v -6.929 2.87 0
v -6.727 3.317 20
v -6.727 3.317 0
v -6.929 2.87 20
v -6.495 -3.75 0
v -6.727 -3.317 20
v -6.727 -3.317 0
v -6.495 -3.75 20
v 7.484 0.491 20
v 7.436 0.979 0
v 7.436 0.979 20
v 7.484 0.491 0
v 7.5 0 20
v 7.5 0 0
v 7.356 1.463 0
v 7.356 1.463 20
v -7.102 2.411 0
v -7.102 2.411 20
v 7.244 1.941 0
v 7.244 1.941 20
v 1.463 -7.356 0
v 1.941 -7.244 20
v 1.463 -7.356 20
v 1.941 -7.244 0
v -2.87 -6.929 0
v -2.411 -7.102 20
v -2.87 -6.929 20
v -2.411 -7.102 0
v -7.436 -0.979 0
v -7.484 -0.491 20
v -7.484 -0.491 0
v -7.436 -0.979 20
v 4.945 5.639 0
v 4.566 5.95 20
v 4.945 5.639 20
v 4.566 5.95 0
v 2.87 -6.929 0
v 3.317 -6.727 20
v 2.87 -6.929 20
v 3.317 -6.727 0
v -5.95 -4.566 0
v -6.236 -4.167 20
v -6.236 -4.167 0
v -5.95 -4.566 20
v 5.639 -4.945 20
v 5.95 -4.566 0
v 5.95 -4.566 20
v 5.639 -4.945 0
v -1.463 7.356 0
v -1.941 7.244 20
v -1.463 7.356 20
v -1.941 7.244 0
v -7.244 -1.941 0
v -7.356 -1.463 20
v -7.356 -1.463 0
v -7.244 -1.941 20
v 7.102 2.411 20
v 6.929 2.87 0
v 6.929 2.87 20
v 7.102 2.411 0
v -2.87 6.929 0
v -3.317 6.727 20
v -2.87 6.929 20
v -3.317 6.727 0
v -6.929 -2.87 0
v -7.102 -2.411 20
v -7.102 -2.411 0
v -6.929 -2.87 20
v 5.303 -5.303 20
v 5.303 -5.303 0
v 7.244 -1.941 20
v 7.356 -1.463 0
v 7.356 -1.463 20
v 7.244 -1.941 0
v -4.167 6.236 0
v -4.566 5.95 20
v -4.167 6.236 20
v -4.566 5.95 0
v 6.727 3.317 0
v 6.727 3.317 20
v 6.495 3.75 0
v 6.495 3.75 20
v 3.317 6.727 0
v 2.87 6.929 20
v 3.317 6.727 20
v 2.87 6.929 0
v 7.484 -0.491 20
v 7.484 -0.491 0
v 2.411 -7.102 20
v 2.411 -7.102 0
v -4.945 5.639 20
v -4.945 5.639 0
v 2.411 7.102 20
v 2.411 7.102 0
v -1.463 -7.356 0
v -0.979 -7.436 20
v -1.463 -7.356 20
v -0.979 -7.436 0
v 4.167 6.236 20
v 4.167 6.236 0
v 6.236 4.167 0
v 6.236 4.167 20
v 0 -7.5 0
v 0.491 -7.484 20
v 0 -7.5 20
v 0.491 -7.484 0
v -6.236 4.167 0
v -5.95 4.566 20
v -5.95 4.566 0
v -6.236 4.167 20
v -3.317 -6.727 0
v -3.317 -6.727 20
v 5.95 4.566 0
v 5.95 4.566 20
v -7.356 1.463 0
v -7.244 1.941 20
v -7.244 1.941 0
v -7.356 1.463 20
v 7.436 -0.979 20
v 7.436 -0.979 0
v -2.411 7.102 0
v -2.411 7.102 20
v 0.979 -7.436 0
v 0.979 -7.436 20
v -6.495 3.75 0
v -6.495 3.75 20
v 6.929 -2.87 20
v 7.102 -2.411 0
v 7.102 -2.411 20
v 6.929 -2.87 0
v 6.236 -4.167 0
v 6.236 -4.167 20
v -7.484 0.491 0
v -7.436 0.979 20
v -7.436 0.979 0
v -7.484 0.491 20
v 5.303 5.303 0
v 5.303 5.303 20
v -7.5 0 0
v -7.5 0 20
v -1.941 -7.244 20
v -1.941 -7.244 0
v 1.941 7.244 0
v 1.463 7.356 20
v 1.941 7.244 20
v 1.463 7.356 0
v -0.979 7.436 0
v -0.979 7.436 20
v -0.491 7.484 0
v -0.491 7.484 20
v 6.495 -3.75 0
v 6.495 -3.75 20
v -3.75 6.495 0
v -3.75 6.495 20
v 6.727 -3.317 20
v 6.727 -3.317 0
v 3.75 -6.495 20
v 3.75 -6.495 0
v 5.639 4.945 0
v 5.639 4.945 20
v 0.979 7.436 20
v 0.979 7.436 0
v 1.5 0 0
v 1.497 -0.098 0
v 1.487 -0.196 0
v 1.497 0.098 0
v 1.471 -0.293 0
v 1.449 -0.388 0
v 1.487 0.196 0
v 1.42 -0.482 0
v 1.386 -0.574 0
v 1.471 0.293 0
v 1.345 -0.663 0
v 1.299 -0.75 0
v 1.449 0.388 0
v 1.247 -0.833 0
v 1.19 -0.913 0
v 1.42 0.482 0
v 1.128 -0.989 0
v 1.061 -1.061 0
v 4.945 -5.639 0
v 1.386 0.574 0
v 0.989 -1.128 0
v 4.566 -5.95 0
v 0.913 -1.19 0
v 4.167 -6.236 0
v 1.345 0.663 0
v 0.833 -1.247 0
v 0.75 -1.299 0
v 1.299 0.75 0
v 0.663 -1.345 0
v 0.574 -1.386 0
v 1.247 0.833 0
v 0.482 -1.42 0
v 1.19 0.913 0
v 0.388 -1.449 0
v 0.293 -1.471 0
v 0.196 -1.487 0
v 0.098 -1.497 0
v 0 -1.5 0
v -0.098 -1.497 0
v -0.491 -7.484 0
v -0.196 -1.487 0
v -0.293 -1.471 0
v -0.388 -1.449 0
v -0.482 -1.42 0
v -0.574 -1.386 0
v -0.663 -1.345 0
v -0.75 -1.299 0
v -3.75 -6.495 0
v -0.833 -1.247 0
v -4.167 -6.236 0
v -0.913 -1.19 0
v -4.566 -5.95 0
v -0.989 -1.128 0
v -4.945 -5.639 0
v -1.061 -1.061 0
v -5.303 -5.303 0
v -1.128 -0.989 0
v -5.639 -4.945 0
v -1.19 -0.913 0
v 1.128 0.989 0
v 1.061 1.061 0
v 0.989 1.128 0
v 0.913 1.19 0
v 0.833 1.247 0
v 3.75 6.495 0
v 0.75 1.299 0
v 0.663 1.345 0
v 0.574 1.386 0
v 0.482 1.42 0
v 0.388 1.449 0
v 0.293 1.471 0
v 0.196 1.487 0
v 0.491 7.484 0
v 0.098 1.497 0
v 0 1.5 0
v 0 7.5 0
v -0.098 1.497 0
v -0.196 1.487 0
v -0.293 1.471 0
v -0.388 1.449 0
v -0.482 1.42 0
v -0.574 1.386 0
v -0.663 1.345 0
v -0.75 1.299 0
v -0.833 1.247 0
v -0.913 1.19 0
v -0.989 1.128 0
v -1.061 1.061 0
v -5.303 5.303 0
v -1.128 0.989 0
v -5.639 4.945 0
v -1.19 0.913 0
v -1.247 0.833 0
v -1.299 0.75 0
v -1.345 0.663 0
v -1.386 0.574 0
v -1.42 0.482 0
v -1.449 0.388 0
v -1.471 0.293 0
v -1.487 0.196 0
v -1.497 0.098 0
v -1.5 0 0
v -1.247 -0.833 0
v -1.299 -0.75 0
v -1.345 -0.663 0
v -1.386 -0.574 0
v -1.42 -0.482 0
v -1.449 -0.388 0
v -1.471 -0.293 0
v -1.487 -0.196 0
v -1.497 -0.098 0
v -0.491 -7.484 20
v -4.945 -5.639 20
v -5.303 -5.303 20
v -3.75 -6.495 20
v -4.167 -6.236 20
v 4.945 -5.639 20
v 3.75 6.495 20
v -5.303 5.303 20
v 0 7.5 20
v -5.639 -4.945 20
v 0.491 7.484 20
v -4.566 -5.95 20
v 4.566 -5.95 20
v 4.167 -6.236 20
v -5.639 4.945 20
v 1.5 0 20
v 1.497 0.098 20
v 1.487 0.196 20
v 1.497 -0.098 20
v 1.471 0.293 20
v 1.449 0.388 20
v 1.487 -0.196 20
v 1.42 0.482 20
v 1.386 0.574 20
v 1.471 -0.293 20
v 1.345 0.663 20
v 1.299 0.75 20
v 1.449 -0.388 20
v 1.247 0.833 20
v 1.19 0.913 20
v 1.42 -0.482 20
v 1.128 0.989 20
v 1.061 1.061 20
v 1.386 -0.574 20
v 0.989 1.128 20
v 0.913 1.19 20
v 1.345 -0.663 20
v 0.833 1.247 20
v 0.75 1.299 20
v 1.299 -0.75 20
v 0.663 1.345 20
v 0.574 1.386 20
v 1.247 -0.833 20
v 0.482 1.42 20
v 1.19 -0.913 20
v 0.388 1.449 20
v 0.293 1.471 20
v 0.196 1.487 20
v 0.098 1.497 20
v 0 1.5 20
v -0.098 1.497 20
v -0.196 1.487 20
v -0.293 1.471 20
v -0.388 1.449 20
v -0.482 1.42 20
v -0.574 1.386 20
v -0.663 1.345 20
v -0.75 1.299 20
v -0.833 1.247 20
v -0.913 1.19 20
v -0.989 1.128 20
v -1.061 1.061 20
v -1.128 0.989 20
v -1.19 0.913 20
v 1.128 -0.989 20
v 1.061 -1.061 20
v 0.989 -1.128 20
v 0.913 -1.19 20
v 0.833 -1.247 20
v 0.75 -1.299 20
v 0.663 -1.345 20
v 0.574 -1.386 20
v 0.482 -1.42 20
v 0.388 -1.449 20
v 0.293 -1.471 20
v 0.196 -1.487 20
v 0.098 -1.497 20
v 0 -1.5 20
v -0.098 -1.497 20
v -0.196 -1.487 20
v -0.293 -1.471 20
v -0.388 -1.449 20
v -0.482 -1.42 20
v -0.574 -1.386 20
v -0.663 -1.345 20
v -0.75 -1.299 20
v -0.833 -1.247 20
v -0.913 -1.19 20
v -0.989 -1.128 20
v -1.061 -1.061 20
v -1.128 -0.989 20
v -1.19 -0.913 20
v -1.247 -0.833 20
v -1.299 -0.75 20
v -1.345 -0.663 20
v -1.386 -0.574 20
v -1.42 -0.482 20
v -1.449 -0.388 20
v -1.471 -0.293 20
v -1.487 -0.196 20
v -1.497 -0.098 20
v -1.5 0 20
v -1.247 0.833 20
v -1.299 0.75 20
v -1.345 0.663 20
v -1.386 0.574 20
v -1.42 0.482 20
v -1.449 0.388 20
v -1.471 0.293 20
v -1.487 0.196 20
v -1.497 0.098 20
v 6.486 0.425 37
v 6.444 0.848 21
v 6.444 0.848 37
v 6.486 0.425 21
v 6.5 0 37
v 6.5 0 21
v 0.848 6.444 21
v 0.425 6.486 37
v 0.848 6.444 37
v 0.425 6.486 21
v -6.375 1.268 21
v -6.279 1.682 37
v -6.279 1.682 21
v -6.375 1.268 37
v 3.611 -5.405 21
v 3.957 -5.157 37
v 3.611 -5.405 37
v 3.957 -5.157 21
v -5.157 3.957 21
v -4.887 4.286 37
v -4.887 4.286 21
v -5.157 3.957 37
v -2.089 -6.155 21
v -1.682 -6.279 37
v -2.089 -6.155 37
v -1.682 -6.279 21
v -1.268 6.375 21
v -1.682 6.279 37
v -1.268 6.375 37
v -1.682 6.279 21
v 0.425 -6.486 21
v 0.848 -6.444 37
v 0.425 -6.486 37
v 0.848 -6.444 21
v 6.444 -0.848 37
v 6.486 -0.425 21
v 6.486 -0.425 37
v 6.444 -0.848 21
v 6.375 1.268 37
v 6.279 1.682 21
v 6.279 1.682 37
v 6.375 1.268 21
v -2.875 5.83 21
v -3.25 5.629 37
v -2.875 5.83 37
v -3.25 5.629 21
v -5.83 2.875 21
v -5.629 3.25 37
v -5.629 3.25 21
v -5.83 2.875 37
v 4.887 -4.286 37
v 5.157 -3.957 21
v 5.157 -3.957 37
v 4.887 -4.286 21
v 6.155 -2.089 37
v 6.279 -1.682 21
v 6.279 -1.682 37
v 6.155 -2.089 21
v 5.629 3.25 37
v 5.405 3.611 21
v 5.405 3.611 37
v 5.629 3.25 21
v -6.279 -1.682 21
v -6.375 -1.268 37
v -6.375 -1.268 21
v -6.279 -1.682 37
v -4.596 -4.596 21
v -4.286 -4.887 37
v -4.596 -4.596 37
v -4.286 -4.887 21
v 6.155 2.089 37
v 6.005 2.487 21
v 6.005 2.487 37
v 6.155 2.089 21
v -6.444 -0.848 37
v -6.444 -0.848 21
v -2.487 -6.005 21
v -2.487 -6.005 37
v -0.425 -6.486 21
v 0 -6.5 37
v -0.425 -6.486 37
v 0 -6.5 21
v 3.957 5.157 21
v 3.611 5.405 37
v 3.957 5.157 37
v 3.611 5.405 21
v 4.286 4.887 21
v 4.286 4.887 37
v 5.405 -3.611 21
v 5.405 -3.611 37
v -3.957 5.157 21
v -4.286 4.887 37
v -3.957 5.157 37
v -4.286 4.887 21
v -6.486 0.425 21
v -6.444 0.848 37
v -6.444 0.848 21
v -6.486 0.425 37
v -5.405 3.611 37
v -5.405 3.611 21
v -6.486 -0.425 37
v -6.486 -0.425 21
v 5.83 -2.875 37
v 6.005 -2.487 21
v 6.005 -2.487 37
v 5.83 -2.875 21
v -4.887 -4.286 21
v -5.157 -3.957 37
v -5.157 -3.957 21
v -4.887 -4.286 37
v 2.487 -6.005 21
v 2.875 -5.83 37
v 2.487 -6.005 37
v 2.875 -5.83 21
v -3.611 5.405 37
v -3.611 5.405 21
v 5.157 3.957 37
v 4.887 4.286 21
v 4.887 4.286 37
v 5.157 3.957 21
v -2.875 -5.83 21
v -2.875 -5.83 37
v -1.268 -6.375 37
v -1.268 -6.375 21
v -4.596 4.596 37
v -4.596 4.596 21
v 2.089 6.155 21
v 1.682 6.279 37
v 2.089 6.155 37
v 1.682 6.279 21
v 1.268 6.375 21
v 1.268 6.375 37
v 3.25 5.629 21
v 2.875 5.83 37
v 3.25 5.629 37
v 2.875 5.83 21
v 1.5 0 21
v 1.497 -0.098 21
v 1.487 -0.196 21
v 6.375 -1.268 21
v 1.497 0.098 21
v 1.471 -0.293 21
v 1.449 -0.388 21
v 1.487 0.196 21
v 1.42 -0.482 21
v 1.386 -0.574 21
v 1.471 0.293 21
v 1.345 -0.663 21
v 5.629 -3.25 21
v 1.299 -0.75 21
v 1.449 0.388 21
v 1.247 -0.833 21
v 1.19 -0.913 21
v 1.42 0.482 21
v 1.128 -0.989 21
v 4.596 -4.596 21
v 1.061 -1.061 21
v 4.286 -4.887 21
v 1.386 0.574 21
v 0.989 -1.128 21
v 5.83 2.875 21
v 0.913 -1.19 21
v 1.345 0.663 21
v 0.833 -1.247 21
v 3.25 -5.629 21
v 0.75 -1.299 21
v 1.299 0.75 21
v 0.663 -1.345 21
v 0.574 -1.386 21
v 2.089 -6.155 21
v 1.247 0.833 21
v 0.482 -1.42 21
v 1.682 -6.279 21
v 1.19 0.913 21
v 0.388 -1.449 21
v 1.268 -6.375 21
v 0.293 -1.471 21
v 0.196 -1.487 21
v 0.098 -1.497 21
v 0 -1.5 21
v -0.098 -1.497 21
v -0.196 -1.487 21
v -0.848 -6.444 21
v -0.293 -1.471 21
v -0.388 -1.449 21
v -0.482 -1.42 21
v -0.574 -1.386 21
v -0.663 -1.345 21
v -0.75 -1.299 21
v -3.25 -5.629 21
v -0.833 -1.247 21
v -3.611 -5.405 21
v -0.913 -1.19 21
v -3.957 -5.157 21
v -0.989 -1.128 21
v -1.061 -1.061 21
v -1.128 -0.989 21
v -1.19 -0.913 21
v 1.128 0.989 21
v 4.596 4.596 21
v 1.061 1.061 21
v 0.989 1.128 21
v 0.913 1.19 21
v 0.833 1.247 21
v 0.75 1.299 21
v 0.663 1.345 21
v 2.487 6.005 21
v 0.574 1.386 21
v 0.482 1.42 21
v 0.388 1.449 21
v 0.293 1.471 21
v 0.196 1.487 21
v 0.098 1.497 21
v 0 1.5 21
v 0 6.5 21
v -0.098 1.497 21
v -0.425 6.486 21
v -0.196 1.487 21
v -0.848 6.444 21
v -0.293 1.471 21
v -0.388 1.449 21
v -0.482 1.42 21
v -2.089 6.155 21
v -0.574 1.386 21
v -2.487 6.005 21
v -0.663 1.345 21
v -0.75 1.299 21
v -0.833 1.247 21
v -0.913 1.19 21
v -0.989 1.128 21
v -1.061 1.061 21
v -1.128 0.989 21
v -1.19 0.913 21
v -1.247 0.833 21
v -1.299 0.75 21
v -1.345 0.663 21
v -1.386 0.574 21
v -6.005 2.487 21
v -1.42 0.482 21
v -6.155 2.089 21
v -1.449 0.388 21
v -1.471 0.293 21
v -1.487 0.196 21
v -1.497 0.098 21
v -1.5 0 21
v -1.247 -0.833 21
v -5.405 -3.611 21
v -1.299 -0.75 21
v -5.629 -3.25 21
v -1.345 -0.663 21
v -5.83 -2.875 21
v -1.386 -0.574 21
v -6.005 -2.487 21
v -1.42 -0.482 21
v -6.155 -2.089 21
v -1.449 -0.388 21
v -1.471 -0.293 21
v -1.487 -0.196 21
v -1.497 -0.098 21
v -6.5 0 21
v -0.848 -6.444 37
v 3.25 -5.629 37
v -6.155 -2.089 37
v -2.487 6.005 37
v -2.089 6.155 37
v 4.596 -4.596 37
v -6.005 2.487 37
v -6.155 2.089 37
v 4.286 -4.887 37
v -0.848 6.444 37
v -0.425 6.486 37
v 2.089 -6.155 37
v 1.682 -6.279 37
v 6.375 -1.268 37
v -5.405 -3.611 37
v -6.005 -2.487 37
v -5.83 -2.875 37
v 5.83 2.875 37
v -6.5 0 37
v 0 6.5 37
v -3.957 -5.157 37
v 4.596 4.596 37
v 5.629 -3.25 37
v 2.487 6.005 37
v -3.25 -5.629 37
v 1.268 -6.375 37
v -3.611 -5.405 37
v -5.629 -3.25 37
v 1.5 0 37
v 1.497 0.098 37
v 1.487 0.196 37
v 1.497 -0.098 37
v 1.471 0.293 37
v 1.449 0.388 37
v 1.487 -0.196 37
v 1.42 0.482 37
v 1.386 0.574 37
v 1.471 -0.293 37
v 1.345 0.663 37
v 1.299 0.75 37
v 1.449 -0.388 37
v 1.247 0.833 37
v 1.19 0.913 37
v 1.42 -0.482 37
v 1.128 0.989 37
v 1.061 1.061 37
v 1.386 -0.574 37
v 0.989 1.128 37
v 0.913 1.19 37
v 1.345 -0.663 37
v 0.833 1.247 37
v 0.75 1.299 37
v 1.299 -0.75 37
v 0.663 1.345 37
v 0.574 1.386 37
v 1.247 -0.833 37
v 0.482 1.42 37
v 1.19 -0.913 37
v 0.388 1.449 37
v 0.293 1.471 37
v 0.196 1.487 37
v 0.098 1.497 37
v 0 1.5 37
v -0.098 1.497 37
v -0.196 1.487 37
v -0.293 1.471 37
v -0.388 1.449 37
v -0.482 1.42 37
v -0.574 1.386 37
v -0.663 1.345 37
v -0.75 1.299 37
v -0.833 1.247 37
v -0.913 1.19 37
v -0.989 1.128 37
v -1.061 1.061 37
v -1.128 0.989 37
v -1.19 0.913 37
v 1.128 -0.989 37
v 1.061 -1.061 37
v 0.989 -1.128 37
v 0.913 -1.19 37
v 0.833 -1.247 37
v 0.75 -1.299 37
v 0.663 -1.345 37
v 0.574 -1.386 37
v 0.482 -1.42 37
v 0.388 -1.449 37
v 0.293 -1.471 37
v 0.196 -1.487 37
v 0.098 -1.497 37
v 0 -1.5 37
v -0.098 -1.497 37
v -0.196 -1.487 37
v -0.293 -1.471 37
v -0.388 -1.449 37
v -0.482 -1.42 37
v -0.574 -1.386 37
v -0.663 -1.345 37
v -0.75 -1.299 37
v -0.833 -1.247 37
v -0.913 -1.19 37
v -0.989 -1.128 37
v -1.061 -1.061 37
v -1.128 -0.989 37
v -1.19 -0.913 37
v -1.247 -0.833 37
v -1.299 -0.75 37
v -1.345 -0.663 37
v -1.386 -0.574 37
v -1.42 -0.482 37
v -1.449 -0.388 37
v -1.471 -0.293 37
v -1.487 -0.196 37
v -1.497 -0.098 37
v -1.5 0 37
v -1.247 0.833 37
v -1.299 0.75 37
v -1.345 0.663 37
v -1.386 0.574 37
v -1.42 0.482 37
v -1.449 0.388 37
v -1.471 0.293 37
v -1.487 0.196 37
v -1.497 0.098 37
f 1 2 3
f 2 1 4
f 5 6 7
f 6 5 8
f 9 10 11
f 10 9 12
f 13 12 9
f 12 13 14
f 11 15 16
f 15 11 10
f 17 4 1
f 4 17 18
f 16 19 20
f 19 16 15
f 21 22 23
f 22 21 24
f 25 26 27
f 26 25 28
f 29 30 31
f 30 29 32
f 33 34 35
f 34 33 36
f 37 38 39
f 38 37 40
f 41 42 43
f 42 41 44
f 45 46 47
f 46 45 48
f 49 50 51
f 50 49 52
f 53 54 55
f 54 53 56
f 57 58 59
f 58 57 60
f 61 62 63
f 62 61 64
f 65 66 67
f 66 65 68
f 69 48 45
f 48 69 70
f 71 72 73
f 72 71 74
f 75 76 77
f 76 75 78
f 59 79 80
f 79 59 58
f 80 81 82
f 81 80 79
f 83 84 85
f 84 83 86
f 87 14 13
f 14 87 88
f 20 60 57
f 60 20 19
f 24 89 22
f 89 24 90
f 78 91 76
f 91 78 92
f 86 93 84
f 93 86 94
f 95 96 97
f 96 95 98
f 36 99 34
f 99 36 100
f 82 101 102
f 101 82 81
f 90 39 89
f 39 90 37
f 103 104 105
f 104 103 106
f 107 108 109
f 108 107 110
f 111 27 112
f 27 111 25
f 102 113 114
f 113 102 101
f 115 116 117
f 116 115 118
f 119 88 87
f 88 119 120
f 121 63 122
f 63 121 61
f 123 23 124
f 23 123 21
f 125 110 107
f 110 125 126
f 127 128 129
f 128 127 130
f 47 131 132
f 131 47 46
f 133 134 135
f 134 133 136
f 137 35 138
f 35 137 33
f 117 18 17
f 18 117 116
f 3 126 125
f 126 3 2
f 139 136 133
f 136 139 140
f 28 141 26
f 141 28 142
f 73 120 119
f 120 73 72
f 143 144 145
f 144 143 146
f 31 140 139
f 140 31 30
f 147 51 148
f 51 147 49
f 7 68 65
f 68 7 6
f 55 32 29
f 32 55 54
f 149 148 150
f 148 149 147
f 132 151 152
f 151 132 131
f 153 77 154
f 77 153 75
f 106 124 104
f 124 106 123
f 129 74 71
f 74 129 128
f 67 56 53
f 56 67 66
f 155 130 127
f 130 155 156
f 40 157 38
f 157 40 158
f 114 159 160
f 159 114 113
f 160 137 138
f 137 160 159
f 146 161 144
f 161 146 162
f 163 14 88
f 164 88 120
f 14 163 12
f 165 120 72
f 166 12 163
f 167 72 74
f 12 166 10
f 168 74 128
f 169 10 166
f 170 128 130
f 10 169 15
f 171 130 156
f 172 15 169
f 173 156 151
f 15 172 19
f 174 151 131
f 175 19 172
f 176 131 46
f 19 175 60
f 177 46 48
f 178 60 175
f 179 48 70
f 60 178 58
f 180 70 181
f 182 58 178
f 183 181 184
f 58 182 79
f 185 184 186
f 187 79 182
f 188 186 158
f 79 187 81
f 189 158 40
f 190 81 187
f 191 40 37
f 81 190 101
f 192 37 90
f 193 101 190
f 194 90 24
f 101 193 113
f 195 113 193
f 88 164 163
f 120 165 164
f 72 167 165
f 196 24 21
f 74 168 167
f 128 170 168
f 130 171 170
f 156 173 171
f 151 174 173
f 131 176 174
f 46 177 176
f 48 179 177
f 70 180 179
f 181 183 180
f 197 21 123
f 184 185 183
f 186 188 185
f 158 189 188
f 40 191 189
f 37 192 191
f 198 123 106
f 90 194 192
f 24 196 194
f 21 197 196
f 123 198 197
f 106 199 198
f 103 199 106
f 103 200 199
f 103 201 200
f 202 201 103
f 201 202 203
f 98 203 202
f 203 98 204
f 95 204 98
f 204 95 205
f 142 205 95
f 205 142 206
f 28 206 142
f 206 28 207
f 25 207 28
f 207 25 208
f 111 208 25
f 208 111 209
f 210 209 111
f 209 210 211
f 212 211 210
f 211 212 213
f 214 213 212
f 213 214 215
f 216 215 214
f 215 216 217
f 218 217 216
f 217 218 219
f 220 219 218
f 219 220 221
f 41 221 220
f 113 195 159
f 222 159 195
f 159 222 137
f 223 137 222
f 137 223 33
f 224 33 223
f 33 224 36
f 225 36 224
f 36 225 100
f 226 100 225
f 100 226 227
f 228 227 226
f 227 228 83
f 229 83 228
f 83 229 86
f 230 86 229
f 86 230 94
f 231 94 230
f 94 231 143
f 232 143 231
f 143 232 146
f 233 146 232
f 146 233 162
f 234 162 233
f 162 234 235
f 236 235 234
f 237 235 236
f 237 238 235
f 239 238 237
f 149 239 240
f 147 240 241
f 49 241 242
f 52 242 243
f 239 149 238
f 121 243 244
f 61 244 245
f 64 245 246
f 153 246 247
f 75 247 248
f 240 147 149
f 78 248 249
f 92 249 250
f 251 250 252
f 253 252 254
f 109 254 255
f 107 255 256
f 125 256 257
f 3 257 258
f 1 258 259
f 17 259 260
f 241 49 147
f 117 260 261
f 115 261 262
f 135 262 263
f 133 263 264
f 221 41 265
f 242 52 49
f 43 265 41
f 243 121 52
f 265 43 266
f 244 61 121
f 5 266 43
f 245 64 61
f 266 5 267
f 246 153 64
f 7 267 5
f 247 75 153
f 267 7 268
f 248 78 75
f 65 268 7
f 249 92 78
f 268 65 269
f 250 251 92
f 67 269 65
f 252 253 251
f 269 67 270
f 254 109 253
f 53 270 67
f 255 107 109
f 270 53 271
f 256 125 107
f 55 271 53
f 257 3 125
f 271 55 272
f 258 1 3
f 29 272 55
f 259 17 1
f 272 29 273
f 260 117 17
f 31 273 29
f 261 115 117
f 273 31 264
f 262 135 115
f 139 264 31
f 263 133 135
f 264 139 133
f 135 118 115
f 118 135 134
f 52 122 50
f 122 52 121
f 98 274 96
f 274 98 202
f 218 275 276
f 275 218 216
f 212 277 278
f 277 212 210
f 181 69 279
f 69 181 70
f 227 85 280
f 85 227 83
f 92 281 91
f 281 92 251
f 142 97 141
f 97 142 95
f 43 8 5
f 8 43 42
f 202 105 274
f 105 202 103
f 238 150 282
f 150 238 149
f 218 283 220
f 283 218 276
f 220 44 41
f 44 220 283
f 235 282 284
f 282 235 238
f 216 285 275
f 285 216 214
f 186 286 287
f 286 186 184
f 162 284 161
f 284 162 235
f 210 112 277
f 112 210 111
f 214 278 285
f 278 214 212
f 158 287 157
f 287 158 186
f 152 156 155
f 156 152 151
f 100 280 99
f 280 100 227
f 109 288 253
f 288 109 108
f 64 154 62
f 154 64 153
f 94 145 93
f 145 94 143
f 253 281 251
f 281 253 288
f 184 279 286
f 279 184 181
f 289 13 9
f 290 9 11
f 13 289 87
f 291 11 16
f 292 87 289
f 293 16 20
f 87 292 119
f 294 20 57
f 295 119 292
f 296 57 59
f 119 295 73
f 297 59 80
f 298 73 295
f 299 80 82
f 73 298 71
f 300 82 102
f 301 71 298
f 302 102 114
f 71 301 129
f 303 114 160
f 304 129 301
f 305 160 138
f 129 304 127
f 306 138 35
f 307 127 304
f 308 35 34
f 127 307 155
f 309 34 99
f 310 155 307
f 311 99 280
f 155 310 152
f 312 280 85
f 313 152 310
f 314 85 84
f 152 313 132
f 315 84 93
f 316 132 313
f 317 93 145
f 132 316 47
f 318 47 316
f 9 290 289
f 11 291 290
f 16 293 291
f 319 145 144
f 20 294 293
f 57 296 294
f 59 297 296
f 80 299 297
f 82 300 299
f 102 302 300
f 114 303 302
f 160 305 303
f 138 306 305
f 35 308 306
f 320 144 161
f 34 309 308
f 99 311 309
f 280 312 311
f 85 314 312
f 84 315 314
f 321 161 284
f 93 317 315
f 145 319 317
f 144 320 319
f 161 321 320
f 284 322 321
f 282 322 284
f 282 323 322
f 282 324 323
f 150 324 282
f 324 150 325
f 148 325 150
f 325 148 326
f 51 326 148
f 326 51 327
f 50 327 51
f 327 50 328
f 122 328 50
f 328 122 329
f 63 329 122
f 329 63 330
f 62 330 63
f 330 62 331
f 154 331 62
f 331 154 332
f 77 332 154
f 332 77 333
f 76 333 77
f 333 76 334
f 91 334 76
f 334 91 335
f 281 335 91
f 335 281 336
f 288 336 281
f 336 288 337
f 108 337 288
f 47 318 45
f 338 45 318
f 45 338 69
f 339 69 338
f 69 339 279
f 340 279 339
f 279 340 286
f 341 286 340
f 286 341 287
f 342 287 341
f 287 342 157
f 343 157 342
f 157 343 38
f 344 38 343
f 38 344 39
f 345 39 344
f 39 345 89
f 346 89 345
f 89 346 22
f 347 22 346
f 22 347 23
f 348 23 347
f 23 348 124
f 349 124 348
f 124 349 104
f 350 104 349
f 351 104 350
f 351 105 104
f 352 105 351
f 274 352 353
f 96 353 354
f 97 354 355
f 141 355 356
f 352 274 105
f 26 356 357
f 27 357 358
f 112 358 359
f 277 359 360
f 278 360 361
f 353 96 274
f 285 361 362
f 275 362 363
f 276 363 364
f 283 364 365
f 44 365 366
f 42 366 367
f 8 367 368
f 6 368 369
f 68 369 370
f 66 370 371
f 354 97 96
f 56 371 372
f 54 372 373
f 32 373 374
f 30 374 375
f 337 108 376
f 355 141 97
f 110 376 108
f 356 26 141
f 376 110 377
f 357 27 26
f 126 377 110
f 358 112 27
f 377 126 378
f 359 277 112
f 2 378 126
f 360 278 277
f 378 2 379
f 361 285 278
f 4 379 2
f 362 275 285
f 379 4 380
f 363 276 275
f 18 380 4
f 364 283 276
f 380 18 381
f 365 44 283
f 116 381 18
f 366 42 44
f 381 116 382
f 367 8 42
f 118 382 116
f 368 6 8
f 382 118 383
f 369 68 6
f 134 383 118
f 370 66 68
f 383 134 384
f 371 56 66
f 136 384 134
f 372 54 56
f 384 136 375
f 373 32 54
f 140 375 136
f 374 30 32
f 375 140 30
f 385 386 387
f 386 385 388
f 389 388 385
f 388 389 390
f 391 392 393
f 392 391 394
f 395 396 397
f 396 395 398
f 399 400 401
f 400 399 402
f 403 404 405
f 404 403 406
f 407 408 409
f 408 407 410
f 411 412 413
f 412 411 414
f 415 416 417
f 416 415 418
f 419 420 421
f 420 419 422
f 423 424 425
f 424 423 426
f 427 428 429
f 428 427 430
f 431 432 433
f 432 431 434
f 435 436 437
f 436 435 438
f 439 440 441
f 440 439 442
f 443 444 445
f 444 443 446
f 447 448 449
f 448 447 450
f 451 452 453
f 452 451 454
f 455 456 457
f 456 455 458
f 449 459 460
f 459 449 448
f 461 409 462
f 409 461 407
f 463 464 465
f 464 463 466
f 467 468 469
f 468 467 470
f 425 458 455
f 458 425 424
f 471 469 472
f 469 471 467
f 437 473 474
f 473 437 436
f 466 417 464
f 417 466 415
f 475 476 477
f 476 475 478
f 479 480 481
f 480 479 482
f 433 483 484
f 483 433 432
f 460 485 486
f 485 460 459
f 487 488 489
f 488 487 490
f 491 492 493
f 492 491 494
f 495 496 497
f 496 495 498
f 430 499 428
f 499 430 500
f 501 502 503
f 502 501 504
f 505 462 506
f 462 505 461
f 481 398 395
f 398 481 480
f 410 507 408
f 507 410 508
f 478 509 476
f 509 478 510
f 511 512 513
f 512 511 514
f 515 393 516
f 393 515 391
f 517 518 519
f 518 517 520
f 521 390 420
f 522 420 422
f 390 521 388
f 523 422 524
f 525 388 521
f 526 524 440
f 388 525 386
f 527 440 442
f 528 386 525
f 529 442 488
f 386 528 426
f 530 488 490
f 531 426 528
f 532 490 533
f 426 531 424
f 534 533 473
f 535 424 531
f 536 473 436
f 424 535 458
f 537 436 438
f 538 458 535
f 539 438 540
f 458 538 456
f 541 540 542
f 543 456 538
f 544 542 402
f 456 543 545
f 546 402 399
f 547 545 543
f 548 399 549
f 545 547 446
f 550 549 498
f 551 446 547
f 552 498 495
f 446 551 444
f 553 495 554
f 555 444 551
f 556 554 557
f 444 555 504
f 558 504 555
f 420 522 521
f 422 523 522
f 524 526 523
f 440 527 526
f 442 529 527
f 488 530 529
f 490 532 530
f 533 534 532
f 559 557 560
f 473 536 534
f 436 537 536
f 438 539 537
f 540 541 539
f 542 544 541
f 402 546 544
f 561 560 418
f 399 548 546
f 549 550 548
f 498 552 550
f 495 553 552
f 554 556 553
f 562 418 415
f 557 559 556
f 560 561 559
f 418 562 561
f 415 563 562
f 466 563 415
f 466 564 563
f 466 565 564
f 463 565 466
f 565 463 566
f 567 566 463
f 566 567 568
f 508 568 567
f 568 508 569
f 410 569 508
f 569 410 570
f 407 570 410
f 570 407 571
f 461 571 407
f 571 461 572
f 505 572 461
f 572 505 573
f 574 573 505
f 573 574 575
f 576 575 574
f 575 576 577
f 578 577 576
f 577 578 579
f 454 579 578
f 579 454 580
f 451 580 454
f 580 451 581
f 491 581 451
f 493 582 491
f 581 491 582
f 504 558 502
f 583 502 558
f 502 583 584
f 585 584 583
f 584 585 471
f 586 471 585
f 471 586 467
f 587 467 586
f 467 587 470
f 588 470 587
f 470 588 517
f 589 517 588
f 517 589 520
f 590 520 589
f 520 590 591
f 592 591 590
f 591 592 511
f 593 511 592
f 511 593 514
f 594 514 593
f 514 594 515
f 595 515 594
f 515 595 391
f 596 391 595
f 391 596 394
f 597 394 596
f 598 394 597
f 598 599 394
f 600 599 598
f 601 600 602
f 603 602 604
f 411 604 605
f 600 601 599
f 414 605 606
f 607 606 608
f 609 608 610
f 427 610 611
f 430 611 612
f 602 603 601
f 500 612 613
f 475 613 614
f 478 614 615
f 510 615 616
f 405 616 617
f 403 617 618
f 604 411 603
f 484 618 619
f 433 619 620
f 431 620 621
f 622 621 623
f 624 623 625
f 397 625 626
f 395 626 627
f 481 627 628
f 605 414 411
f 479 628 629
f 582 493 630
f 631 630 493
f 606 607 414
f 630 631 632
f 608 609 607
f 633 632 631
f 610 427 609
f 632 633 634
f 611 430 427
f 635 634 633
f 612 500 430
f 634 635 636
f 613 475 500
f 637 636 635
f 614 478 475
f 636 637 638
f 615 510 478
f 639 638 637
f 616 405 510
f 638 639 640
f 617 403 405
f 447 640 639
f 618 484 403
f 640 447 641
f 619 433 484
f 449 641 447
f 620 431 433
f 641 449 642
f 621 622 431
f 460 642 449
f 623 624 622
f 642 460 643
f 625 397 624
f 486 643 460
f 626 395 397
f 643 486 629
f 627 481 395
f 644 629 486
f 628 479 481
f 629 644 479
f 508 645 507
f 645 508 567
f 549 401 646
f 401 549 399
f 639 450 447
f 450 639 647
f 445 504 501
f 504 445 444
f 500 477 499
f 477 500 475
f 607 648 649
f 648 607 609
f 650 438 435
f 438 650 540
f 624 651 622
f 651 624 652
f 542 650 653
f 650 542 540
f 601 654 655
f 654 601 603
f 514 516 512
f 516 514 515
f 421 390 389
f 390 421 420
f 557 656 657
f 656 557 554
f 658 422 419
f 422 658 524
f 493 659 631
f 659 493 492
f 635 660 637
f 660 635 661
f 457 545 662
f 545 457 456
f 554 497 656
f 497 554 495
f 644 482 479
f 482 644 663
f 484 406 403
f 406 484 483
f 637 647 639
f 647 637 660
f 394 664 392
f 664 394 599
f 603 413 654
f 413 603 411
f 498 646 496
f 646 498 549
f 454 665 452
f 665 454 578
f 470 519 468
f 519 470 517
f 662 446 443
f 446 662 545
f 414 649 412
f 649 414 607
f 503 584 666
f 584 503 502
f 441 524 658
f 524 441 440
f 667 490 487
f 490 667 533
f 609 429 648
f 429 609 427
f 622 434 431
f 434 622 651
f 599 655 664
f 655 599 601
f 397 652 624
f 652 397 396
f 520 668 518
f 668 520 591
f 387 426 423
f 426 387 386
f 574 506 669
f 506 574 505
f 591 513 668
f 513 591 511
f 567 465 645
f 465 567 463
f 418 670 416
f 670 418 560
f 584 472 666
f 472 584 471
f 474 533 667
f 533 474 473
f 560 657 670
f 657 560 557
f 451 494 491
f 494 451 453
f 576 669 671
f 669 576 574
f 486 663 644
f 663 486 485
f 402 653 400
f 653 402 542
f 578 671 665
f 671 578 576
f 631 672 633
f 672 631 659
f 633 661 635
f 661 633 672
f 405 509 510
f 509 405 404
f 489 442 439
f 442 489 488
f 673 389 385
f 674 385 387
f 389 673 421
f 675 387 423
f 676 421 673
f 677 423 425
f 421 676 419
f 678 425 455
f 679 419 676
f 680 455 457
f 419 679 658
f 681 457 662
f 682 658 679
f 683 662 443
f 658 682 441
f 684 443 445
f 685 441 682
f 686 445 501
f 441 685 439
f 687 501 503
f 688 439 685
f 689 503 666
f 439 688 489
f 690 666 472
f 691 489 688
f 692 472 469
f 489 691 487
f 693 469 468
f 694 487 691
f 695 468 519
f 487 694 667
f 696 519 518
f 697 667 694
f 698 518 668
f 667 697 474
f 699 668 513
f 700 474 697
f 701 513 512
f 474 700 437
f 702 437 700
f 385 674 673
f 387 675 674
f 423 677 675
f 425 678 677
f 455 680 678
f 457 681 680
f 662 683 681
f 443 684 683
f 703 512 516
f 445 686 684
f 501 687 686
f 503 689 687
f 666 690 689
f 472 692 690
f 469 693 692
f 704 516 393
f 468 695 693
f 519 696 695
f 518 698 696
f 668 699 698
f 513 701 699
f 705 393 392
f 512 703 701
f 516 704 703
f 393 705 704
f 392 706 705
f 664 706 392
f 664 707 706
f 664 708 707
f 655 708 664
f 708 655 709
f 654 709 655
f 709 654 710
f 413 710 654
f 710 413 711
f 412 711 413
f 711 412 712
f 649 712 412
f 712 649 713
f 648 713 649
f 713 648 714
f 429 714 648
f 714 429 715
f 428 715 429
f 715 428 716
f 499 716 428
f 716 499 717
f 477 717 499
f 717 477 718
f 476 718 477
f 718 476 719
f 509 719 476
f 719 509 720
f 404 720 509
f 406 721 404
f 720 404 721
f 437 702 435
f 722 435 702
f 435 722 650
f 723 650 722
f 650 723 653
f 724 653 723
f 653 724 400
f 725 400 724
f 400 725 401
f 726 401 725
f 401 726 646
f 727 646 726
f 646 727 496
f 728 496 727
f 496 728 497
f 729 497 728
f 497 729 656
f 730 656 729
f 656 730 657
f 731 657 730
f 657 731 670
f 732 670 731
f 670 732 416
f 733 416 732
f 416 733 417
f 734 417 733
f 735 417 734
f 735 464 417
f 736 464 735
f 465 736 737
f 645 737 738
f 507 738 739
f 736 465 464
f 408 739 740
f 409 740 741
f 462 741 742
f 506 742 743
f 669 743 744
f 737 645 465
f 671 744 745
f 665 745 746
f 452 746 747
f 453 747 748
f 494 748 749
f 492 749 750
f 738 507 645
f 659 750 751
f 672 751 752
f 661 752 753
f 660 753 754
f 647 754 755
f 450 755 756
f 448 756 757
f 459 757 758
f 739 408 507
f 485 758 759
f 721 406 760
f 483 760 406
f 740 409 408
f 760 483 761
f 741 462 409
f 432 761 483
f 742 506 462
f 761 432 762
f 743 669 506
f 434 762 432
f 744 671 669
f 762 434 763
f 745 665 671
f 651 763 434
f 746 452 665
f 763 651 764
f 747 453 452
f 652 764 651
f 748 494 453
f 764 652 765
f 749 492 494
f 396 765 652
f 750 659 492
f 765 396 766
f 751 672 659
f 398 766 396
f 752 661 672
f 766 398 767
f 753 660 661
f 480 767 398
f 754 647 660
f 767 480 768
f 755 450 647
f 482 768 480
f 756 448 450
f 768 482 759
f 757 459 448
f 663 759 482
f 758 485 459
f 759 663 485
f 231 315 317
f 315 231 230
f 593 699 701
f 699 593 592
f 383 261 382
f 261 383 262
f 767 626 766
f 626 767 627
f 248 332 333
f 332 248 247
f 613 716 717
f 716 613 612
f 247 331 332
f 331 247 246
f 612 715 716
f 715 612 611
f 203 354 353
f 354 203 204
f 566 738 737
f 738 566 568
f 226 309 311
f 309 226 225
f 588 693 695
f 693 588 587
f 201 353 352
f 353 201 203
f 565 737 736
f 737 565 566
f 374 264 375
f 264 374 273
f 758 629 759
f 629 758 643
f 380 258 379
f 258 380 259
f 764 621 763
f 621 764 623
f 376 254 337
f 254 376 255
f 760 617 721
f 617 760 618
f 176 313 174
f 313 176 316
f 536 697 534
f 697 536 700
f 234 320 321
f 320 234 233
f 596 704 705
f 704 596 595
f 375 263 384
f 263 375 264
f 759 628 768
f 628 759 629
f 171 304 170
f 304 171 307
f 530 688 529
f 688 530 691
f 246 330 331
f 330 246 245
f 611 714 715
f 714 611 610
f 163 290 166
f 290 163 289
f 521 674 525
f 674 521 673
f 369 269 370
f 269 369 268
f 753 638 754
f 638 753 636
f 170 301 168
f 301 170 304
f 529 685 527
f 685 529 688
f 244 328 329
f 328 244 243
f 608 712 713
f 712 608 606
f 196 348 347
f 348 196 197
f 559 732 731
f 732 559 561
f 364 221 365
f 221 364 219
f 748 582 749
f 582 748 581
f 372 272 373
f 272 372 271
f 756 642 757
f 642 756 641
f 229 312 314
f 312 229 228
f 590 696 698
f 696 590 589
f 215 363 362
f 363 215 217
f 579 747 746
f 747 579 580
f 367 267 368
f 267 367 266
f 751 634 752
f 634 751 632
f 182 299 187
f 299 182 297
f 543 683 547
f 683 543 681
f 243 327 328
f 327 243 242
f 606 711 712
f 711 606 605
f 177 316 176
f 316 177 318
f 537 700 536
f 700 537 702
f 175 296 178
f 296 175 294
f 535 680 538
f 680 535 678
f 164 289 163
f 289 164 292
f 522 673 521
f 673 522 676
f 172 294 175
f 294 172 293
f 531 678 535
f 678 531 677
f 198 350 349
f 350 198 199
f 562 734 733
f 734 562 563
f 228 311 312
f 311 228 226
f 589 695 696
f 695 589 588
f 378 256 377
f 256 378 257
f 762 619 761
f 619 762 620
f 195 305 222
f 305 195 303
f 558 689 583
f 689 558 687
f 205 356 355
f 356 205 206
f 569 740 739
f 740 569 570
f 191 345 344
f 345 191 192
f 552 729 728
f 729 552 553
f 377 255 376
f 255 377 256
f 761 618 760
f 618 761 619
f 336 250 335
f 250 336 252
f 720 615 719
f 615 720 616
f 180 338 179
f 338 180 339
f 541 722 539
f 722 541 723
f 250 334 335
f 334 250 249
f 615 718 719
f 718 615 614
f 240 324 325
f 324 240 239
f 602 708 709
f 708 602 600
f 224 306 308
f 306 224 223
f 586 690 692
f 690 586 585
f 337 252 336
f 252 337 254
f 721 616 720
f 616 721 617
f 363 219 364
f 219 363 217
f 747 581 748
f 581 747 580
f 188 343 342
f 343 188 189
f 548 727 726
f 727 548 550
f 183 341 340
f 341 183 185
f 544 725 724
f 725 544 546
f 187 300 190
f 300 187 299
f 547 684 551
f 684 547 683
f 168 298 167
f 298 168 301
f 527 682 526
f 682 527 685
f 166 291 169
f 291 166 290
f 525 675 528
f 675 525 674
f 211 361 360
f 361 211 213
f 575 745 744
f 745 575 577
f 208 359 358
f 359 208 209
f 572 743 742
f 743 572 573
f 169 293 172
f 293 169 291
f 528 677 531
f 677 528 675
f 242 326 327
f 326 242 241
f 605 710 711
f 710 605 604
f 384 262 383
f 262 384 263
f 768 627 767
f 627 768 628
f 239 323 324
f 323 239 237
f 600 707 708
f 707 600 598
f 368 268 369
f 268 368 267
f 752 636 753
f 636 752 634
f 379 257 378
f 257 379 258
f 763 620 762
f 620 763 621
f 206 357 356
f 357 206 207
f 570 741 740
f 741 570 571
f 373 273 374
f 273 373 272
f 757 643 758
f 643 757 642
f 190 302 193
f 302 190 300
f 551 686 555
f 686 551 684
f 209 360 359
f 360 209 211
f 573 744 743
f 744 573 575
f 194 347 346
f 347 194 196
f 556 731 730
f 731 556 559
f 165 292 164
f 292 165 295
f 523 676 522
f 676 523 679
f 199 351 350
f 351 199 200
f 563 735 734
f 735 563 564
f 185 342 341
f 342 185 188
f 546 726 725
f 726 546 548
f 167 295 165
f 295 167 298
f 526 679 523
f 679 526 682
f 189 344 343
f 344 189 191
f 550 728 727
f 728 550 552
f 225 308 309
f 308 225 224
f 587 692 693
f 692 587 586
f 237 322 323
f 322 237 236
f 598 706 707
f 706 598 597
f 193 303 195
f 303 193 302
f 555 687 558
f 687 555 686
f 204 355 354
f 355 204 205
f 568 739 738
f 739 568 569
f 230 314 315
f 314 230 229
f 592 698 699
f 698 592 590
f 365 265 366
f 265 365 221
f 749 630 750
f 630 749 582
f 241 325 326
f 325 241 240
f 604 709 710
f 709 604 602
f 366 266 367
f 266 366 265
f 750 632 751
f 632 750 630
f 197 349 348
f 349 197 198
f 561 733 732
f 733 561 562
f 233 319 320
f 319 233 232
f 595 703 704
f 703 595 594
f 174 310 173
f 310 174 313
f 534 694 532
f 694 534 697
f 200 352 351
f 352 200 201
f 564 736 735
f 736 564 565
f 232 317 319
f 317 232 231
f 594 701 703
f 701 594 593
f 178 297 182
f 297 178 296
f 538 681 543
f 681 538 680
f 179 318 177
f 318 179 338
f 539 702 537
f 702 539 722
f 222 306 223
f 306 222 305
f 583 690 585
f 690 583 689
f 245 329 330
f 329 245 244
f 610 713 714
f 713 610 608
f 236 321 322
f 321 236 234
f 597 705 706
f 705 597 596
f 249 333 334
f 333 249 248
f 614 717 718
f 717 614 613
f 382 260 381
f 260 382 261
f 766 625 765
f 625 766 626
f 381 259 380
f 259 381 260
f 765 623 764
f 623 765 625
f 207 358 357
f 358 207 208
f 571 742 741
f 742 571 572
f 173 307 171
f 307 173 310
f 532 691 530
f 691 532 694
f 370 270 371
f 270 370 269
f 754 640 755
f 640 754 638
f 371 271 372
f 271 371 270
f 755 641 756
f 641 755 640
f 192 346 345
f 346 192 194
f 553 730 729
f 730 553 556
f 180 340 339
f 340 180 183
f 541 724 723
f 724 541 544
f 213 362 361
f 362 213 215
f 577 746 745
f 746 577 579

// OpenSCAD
// Straight hose-barb reducer: 8 mm tubing (z = 0..20) -> 5 mm tubing (z = 25..41)
// Print orientation: standing upright along +Z, centred on the origin in X/Y.
// Units: mm. Bore through full length: 3 mm.

// ---------------- Parameters ----------------
reducer_bore      = 3;     // through-bore diameter
barb_8_tube_od    = 7.5;   // 8 mm tubing barb outer diameter (bottom)
barb_8_tube_top_od = 9.5;  // 8 mm tubing barb outer diameter (top)
barb_8_tube_h     = 10;    // 8 mm tubing barb height
barb_8_count      = 2;     // number of 8 mm barbs (stacked)

barb_5_tube_od    = 6.5;   // 5 mm tubing barb outer diameter (bottom)
barb_5_tube_top_od = 5.0;  // 5 mm tubing barb outer diameter (top)
barb_5_tube_h     = 8;     // 5 mm tubing barb height
barb_5_count      = 2;     // number of 5 mm barbs (stacked)

collar_d          = 12;    // transition collar diameter
collar_h          = 5;     // transition collar height (z = 20..25)

eps               = 0.5;   // overshoot for clean boolean cuts

$fn = 96;

// ---------------- Model ----------------
difference() {
    union() {
        // 8 mm tubing barbs
        for (i = [0 : barb_8_count - 1]) {
            translate([0, 0, i * barb_8_tube_h])
                cylinder(h = barb_8_tube_h, r = barb_8_tube_od);
        }

        // 5 mm tubing barbs
        for (i = [0 : barb_5_count - 1]) {
            translate([0, 0, (barb_5_count * barb_5_tube_h + collar_h) + i * barb_5_tube_h])
                cylinder(h = barb_5_tube_h, r = barb_5_tube_od);
        }

        // Transition collar (z = 20..25)
        translate([0, 0, collar_h])
            cylinder(h = collar_h, r = collar_d / 2);
    }

    // Through bore
    translate([0, 0, -eps])
        cylinder(h = barb_8_count * barb_8_tube_h + collar_h + barb_5_count * barb_5_tube_h + 2 * eps,
                 d = reducer_bore);
}
